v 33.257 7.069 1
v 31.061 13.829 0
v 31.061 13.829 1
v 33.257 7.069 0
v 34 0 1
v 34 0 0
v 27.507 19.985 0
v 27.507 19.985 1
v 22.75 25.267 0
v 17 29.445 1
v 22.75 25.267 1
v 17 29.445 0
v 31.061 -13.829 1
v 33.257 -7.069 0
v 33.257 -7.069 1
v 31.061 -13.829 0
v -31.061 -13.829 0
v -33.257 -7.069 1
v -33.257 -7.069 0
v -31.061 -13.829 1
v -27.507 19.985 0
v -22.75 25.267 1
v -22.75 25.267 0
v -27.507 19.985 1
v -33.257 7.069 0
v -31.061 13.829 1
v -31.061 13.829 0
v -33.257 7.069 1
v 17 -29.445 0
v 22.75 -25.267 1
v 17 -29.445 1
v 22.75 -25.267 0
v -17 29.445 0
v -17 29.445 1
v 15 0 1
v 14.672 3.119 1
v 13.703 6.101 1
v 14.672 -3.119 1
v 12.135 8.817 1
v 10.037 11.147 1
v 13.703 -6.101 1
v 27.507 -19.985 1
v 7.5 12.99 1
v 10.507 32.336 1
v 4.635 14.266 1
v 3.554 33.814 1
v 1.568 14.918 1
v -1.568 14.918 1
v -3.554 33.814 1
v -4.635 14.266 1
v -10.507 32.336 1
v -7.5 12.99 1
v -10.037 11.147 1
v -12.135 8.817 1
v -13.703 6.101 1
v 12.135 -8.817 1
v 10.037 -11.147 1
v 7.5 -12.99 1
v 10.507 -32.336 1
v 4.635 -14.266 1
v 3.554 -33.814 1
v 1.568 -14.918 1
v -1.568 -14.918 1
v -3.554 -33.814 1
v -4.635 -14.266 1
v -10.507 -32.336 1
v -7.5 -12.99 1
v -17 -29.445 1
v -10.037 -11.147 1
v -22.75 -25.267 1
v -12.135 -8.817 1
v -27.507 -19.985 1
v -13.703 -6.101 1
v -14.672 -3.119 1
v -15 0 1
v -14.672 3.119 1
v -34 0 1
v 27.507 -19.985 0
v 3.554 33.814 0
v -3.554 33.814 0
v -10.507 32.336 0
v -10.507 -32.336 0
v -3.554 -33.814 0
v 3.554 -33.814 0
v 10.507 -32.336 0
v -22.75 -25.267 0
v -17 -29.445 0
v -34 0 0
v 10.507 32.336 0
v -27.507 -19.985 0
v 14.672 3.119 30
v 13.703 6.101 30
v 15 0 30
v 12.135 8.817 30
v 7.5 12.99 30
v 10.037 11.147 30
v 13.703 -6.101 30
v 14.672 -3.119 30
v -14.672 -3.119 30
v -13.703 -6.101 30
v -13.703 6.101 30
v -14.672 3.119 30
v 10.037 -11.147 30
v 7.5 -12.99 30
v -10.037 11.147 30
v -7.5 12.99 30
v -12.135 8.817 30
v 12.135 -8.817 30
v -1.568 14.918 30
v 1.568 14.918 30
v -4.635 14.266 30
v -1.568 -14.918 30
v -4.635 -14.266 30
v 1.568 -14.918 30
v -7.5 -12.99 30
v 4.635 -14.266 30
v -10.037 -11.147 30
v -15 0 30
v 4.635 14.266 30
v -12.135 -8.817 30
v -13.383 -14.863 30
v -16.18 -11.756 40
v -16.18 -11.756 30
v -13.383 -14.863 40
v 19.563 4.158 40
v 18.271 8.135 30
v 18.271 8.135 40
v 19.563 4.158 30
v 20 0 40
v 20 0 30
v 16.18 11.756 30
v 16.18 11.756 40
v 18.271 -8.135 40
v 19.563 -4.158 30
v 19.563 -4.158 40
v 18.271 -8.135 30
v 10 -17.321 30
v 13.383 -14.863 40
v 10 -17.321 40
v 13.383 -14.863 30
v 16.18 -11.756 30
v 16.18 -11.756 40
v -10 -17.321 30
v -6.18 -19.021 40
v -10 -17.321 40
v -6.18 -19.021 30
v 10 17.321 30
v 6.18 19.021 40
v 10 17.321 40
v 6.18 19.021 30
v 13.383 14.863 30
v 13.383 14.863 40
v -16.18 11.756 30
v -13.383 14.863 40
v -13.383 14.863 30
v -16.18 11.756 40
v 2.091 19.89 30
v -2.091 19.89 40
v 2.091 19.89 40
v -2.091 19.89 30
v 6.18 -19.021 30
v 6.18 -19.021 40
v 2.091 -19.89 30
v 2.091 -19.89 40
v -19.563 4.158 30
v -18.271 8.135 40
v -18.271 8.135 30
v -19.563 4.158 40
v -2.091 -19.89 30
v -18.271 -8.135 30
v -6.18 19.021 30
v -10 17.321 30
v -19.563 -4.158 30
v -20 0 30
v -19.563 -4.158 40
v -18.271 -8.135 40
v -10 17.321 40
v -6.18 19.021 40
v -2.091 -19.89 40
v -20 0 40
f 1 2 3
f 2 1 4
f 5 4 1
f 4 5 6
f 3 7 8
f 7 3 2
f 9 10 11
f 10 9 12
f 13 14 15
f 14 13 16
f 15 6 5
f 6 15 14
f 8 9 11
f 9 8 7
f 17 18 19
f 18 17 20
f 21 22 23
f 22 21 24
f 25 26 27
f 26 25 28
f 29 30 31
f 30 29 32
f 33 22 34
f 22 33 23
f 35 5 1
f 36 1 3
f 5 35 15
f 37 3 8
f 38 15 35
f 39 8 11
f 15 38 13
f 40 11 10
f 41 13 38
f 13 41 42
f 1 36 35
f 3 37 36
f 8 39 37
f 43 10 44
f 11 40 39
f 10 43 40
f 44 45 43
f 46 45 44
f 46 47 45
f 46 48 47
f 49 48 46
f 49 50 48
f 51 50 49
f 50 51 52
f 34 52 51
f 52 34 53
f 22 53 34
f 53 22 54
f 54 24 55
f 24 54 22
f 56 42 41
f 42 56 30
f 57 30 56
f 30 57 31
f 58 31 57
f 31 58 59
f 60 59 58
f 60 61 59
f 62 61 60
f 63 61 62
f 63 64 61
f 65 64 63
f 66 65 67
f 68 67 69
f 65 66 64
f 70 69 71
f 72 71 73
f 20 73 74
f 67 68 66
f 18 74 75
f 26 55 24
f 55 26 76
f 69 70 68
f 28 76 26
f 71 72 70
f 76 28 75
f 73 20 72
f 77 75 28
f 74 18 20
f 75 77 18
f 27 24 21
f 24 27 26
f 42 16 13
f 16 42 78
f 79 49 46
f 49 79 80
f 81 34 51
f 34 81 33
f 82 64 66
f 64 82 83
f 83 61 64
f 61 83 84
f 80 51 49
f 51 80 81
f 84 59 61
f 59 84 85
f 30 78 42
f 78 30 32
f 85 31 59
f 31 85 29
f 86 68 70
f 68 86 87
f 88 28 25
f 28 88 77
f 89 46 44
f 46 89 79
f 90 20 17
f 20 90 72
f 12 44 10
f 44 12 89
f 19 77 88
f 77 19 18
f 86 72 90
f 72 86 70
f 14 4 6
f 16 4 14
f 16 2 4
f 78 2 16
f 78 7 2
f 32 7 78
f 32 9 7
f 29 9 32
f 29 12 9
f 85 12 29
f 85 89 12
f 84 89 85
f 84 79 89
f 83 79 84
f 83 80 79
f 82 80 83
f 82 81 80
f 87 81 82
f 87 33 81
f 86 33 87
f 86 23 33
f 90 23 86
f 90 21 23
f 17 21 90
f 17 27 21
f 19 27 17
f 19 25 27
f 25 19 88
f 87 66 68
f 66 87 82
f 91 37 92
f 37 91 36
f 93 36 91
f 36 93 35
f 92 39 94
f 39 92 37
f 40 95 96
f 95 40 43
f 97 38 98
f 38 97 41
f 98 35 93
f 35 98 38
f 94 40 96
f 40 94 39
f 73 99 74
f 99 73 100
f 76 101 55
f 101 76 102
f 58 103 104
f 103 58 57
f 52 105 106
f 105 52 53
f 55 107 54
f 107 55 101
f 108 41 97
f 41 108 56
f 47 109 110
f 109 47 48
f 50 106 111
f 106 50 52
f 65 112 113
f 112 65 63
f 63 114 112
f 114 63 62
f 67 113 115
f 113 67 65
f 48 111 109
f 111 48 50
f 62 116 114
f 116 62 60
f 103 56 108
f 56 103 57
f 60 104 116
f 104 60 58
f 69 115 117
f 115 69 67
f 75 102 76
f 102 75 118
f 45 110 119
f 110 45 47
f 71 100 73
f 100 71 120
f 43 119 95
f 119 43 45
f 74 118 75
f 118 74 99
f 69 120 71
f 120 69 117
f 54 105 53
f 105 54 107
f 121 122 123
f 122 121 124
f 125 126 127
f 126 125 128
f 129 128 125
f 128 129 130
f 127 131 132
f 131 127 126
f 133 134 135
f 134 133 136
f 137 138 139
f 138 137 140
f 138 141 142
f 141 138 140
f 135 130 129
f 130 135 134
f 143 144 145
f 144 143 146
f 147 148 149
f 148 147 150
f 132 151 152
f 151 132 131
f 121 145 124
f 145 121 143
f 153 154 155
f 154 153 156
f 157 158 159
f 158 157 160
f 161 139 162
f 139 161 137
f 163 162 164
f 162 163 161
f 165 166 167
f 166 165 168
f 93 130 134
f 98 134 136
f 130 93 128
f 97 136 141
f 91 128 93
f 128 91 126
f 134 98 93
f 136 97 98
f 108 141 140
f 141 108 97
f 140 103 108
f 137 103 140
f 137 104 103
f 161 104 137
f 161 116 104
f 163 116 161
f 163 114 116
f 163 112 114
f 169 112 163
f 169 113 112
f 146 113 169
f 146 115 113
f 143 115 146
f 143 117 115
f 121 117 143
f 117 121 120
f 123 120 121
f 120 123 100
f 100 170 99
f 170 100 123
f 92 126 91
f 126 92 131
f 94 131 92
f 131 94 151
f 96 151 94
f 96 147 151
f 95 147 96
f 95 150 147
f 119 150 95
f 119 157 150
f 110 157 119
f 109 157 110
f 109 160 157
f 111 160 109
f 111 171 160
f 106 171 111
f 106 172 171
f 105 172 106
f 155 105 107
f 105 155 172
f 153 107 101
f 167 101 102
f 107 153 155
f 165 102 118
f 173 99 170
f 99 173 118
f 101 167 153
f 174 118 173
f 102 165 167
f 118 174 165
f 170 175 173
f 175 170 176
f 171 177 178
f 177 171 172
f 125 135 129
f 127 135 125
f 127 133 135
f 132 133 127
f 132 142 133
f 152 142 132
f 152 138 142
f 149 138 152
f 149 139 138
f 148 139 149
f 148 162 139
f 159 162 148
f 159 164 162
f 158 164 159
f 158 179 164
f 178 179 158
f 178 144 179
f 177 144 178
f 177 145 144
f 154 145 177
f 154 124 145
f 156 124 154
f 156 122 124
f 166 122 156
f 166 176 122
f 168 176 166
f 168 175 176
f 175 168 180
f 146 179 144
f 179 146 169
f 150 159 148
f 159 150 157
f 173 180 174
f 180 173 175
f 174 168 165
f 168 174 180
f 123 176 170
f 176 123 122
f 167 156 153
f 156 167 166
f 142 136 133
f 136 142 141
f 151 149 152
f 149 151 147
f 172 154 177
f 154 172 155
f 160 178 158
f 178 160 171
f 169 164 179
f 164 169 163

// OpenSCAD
module emergencystop()
{
        color("yellow") cube([68, 68, 53]);
        color("red") translate([34, 34, 53]) cylinder(r=15, h=92-53-10);
        color("red") translate([34, 34, 82]) cylinder(r=20, h=10);
}


module emergencystop2()
{
        color("yellow") cylinder(r=34, h=1);
        color("red") translate([0, 0, 1]) cylinder(r=15, h=30);
        color("red") translate([0, 0, 30]) cylinder(r=20, h=10);
}

emergencystop2();
